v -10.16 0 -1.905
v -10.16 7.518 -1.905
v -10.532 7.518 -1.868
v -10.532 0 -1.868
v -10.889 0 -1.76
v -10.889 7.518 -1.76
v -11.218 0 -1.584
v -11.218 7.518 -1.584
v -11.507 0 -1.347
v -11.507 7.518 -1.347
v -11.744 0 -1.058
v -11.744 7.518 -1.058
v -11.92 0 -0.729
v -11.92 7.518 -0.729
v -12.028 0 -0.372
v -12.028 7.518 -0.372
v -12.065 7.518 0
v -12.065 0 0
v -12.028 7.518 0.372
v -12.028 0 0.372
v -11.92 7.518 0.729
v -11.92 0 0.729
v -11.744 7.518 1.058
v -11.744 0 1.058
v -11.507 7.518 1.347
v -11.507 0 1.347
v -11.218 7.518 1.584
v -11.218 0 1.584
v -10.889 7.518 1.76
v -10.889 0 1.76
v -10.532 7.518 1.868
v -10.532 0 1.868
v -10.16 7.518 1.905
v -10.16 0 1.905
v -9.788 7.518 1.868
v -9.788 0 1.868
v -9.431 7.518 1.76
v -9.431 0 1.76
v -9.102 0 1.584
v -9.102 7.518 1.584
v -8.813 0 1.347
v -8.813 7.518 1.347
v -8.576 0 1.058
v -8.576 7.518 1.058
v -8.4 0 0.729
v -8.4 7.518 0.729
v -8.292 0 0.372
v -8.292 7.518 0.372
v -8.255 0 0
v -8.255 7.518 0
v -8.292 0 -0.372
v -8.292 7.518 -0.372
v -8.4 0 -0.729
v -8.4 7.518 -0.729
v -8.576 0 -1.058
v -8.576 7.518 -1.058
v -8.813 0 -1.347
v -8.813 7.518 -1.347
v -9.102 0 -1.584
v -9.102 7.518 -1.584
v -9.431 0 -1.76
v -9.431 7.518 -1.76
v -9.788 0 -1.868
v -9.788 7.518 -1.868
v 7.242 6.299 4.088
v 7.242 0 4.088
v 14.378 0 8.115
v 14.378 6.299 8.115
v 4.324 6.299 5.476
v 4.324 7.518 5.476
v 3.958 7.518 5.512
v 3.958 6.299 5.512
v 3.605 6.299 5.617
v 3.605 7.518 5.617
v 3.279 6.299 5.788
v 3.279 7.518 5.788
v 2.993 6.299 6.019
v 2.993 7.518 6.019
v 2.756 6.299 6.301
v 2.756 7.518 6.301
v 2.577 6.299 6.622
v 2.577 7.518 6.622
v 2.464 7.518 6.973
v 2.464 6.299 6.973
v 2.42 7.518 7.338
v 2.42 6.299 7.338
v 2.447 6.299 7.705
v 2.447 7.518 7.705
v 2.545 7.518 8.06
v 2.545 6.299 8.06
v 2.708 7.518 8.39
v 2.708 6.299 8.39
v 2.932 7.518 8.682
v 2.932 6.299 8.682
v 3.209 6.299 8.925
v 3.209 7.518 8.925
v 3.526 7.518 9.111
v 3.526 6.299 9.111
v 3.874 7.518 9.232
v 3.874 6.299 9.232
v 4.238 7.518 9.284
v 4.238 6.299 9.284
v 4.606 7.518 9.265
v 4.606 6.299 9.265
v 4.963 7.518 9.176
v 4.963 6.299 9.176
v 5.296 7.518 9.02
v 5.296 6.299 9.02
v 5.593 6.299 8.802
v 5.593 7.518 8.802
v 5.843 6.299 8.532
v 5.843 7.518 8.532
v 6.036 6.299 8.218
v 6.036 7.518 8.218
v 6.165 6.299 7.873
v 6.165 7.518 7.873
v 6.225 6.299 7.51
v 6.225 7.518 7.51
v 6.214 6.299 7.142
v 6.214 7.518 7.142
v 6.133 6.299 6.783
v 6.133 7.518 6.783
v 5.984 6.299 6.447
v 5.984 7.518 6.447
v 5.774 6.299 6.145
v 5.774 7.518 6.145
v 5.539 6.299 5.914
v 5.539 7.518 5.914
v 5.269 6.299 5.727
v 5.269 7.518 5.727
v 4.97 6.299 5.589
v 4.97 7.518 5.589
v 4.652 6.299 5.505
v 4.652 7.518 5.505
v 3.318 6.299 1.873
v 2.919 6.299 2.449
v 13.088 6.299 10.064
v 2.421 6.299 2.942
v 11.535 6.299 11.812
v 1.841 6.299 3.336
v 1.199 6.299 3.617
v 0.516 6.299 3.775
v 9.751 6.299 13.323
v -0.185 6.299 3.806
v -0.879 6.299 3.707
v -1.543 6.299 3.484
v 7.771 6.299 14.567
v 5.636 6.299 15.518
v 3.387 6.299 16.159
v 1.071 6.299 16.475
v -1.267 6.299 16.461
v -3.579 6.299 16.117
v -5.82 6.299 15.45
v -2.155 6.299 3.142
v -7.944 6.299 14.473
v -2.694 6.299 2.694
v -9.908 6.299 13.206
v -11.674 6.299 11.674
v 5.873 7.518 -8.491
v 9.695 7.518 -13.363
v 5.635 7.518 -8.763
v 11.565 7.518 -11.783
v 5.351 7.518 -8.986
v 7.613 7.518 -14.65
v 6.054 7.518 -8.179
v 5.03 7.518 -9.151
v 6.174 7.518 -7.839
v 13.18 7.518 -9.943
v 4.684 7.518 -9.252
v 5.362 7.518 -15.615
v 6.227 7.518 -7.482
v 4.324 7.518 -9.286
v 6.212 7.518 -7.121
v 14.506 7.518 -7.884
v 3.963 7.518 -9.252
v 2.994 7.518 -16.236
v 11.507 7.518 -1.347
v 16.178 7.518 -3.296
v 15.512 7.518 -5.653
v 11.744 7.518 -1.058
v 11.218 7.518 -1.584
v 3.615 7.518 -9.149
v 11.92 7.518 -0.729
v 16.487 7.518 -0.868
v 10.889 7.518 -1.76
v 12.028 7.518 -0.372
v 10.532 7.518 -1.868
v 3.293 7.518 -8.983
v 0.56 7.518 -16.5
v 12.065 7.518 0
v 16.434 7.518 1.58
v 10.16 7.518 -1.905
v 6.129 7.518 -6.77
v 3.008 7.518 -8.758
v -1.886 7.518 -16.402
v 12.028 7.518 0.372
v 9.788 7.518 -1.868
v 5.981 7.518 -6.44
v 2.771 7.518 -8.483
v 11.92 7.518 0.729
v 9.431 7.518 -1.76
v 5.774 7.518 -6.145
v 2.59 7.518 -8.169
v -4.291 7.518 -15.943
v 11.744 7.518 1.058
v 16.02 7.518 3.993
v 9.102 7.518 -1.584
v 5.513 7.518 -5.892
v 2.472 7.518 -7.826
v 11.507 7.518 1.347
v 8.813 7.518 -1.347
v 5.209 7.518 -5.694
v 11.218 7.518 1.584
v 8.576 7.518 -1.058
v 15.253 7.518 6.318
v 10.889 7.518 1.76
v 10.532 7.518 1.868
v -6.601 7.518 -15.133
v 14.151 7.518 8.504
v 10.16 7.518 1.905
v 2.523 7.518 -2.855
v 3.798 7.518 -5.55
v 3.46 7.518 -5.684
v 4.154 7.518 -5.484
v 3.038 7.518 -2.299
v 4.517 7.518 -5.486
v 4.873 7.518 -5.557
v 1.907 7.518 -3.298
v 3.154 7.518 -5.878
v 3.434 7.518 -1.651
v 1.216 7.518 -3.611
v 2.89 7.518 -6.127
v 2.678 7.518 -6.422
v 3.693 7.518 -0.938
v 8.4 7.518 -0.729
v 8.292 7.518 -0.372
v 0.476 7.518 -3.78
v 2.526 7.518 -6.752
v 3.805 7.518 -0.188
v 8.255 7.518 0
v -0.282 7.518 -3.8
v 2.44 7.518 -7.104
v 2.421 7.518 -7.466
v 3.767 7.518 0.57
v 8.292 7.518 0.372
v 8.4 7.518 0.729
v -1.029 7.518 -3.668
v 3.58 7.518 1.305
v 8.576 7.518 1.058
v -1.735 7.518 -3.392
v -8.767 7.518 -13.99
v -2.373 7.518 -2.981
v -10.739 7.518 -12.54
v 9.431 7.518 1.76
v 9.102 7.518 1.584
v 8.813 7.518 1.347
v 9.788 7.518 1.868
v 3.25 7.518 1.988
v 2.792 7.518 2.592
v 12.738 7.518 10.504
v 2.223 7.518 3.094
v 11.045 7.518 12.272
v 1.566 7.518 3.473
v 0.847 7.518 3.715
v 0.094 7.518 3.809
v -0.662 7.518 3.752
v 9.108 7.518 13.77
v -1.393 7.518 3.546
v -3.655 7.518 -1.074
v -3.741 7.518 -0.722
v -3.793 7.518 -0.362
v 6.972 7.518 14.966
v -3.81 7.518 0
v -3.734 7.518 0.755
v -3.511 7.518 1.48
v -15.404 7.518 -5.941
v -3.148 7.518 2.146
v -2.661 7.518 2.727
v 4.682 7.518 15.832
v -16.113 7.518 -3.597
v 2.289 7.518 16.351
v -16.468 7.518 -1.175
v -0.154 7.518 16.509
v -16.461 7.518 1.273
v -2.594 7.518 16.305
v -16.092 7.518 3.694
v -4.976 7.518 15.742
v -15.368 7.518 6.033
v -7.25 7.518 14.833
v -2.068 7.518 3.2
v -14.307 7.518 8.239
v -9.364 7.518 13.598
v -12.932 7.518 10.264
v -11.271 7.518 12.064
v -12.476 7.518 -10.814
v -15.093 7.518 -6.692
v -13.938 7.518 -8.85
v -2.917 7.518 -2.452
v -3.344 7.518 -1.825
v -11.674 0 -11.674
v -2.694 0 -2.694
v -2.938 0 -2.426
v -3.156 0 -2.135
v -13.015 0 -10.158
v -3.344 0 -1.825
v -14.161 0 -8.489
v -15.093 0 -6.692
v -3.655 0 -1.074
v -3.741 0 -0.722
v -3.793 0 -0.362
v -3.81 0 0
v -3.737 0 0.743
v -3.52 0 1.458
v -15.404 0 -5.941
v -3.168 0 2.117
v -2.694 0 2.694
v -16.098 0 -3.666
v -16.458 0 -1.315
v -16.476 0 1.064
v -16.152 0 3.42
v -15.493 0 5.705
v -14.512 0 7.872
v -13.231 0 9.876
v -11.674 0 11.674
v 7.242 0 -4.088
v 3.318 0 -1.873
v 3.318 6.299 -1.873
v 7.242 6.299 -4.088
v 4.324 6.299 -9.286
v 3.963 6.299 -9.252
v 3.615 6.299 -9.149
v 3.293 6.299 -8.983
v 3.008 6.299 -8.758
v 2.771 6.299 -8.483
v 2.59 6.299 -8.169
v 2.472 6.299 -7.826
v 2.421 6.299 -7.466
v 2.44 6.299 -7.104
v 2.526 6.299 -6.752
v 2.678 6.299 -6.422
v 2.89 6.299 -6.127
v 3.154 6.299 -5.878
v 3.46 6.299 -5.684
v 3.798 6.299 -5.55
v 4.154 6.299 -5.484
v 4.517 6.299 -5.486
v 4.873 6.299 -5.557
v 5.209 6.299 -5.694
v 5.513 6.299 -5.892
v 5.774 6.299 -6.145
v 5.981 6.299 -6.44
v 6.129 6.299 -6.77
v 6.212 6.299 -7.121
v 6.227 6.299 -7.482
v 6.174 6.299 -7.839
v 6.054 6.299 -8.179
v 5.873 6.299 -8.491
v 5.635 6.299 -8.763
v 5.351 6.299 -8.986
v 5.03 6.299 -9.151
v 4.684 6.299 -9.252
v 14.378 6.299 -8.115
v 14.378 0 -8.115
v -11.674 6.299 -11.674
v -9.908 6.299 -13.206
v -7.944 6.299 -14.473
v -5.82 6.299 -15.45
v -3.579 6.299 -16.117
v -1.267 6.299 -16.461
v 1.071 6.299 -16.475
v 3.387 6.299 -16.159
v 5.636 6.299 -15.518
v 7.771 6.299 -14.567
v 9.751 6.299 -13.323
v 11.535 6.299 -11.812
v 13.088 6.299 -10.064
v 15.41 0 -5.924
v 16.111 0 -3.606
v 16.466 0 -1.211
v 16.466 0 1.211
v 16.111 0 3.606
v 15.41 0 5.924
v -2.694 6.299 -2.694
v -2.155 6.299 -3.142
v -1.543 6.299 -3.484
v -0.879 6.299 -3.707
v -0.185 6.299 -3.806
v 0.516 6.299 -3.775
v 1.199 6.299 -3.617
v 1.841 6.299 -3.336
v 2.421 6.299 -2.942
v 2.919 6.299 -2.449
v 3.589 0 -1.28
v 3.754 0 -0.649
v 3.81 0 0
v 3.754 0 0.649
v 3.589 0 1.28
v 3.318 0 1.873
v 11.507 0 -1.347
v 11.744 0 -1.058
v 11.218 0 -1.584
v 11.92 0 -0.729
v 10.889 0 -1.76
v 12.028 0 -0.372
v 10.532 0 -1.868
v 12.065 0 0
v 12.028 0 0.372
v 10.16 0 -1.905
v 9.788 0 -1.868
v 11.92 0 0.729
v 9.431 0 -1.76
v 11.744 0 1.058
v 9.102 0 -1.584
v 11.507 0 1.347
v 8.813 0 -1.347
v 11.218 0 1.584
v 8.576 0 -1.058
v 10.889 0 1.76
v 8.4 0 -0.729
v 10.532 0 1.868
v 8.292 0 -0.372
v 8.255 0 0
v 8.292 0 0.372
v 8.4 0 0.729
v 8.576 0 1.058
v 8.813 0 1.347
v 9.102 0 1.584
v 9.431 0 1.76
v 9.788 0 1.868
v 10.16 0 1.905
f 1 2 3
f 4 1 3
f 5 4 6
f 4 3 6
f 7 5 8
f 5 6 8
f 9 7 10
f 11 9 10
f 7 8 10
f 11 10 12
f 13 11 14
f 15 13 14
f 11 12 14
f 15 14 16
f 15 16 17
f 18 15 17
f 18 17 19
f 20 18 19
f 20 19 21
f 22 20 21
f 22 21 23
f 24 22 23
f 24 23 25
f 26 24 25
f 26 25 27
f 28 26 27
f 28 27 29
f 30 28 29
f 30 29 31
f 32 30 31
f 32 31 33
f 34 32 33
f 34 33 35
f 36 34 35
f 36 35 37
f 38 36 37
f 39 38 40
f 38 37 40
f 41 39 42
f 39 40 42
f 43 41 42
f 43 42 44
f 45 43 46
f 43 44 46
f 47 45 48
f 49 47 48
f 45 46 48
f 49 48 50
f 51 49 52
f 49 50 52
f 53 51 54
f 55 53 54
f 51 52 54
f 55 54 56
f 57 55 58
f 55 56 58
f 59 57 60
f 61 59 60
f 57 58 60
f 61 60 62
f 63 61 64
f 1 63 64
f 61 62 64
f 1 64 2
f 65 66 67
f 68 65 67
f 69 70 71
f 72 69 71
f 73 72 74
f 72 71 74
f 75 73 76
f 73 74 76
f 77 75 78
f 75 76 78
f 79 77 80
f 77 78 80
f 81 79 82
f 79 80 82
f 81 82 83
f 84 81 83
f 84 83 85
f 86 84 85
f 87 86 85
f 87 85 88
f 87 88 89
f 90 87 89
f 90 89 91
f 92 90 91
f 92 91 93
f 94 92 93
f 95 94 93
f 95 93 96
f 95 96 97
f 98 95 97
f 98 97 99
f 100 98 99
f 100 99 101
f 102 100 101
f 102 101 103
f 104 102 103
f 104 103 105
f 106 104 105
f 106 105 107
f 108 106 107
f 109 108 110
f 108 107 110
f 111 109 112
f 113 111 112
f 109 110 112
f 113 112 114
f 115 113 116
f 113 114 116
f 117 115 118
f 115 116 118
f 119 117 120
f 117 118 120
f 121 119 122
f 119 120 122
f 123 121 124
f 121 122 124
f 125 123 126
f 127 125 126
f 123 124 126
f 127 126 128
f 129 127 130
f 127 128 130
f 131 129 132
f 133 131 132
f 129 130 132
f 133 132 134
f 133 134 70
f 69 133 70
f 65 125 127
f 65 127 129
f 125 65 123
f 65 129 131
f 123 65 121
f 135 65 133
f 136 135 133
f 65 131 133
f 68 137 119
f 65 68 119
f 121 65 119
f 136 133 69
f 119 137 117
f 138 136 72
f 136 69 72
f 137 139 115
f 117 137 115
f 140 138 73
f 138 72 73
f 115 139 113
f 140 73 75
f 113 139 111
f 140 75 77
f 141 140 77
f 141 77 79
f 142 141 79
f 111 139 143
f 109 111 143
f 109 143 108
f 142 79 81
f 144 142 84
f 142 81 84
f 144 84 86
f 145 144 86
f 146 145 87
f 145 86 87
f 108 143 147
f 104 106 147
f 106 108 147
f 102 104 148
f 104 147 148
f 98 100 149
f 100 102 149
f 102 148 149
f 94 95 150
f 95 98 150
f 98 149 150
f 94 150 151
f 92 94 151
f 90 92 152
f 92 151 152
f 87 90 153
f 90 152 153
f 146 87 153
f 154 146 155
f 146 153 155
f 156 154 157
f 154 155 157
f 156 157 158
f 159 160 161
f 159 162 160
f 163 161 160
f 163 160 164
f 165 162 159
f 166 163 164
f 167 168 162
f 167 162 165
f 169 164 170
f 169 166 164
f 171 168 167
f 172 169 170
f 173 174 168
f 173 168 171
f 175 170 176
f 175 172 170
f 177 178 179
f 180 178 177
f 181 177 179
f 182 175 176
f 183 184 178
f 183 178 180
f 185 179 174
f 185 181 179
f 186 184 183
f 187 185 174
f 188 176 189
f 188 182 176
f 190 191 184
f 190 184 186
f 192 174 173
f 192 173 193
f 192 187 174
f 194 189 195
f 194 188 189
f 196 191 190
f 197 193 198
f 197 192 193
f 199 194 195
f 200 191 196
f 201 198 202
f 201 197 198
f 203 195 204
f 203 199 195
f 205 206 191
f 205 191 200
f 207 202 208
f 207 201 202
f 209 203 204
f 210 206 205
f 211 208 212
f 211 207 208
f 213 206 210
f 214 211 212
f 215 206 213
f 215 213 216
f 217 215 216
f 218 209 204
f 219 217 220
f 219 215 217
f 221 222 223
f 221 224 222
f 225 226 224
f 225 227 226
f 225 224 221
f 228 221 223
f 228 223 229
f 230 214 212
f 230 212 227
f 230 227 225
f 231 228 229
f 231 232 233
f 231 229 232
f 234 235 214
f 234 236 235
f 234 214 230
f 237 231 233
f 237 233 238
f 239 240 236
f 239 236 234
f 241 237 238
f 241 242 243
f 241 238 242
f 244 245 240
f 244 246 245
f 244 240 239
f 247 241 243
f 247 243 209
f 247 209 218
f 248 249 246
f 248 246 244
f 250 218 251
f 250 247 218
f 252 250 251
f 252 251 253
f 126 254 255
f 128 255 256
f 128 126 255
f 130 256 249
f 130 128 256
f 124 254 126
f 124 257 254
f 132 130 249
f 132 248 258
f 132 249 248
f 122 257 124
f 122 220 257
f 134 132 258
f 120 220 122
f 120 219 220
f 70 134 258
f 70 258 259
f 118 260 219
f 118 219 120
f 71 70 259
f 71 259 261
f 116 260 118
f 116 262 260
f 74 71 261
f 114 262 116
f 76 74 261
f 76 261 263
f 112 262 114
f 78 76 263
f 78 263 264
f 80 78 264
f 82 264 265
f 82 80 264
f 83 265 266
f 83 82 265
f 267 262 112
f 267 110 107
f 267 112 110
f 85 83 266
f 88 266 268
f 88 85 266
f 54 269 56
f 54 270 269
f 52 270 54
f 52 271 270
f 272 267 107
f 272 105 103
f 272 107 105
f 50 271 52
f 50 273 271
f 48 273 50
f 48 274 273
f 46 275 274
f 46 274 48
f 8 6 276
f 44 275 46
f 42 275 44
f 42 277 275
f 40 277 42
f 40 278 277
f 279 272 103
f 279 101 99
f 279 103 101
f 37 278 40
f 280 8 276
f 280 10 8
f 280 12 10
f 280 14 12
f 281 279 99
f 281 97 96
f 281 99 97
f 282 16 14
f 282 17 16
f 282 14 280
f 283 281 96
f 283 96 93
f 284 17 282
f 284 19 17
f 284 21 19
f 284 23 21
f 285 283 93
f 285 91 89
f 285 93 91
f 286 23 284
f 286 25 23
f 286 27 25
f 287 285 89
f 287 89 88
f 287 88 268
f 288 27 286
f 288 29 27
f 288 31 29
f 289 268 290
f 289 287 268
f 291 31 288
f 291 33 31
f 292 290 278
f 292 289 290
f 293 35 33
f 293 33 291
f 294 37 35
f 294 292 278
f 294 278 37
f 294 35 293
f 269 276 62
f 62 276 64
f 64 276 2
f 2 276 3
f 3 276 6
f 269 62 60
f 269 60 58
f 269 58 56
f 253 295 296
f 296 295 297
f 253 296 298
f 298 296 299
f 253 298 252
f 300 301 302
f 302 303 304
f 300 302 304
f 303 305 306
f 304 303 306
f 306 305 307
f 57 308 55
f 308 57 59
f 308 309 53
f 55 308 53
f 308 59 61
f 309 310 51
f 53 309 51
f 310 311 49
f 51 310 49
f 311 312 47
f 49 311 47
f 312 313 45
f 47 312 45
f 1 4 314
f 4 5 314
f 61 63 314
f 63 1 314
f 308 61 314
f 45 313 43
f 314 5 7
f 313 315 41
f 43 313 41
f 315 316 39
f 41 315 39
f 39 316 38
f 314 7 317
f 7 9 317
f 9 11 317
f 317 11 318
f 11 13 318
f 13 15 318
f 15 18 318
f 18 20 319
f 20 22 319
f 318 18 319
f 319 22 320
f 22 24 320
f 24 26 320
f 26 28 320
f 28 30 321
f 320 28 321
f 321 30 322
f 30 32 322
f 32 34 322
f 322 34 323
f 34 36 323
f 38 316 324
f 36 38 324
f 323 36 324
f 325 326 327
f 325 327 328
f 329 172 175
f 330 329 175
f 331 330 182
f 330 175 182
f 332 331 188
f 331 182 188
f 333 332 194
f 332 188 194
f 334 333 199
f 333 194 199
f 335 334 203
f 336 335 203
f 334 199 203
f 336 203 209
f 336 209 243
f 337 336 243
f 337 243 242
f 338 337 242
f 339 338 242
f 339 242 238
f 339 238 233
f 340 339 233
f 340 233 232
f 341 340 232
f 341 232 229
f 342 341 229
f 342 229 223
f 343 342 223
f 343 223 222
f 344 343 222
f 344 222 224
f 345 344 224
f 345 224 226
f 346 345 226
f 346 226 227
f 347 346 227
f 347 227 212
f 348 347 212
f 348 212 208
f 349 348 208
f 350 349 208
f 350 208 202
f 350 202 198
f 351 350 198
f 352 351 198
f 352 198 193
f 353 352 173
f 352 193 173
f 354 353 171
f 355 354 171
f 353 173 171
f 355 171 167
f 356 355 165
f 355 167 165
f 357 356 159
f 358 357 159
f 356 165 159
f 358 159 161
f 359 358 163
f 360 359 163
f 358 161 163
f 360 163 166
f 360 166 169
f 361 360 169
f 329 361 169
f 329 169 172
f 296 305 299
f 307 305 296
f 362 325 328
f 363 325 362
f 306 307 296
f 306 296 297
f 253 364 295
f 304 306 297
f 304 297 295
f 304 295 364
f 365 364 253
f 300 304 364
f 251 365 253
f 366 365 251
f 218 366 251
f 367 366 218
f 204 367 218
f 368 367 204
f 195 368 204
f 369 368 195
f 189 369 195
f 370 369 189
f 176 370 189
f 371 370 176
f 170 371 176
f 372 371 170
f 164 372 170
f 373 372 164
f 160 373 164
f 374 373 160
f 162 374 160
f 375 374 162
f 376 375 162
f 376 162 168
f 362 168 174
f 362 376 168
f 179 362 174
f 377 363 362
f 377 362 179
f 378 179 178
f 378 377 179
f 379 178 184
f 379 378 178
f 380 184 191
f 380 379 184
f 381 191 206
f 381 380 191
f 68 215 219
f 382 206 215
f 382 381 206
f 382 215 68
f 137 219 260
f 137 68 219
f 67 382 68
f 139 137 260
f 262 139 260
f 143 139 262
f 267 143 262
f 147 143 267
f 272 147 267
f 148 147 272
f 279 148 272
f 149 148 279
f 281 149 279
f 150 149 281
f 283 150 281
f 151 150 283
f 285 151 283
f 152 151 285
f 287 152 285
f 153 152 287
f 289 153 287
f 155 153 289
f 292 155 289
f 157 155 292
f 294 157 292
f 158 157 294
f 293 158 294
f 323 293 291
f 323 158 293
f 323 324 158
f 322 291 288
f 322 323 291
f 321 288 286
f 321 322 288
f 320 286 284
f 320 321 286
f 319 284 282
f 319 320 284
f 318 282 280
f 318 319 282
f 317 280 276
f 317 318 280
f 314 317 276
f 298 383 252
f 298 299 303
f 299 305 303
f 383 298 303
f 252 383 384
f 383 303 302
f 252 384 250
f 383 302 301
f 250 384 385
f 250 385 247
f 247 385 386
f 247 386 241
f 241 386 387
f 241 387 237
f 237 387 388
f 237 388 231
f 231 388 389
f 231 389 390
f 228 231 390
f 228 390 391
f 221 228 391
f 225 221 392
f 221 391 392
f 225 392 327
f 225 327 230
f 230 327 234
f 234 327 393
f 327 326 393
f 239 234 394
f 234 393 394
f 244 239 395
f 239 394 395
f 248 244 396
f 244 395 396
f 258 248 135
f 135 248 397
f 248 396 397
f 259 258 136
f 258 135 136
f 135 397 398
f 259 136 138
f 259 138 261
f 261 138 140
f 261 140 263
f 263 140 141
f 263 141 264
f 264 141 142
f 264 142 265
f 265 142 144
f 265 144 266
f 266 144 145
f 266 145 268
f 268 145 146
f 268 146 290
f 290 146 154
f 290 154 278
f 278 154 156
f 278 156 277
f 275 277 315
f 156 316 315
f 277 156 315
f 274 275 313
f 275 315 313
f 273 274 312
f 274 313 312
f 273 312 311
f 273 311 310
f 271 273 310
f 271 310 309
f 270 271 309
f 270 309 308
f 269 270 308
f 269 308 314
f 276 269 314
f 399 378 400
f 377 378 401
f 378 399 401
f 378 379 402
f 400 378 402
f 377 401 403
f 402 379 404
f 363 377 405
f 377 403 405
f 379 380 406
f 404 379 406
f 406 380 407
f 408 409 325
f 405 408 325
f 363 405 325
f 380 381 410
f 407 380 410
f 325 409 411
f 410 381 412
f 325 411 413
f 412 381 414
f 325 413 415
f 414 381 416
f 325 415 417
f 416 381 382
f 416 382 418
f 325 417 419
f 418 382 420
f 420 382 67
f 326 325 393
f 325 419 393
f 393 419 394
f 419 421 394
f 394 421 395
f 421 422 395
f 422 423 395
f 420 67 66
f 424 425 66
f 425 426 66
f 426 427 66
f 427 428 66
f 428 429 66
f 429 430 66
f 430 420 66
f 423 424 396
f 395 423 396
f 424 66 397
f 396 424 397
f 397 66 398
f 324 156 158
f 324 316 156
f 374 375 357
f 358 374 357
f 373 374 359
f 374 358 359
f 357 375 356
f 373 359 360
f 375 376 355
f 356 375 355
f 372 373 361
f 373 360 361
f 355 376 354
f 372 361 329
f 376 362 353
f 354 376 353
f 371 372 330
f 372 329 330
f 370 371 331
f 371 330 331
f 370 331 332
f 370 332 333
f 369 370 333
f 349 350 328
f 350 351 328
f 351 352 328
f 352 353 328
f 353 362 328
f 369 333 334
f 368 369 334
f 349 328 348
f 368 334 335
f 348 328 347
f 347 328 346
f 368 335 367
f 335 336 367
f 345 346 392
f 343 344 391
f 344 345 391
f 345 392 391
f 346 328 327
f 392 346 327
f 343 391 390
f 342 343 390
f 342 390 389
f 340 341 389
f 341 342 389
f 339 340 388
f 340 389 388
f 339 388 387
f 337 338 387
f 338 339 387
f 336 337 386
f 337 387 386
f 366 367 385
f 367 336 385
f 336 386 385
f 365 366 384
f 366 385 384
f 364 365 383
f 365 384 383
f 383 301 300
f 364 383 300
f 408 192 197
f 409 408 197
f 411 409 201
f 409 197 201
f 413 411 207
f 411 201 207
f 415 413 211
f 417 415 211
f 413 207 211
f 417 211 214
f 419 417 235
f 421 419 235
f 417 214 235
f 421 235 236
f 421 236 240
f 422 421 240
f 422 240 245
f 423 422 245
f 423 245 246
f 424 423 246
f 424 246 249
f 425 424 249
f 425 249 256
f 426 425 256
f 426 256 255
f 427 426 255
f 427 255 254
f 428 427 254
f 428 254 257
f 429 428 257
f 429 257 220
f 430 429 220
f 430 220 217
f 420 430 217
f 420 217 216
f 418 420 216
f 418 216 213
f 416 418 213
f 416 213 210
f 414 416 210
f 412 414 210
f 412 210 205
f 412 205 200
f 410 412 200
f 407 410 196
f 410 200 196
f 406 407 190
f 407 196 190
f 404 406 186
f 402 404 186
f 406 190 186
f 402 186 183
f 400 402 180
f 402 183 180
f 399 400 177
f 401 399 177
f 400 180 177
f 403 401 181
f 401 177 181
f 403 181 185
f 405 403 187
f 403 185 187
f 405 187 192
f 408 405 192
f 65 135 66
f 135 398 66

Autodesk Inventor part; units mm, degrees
ref_plane "YZ Plane" through (0, 0, 0) normal (1, 0, 0) x (0, 1, 0)
ref_plane "XZ Plane" through (0, 0, 0) normal (0, 1, 0) x (-1, 0, 0)
ref_plane "XY Plane" through (0, 0, 0) normal (0, 0, 1) x (1, 0, 0)
sketch "Sketch1" plane through (0, 0, 0) normal (0, 1, 0) x (-1, 0, 0)
  circle A0 centre (0, 0) radius 3.81
  circle A1 centre (0, 0) radius 16.51
  line L0 (-7.4994, -5) -> (-1.1494, -5)
  line L1 (-1.1494, -5) -> (-1.1494, -11.35)
  line L2 (-1.1494, -11.35) -> (-7.4994, -11.35)
  line L3 (-7.4994, -11.35) -> (-7.4994, -5)
  line L4 (-7.4994, 5) -> (-1.1494, 5)
  line L5 (-1.1494, 5) -> (-1.1494, 11.35)
  line L6 (-1.1494, 11.35) -> (-7.4994, 11.35)
  line L7 (-7.4994, 11.35) -> (-7.4994, 5)
  circle A2 centre (-4.3244, -7.3812) radius 1.7526
  circle A3 centre (-4.3244, 7.3812) radius 1.7526
  line L8 (0, 0) -> (-10.16, 0)
  line L9 (0, 0) -> (10.16, 0)
  circle A4 centre (-10.16, 0) radius 1.7526
  circle A5 centre (10.16, 0) radius 1.7526
  line L10 (-4.3244, -8.175) -> (-10.16, 0)
  line L11 (-10.16, 0) -> (-4.3244, 8.175)
  line L12 (0, 0) -> (-7.2422, 4.0875)
  line L13 (0, 0) -> (-7.2422, -4.0875)
  line L14 (-7.2422, -4.0875) -> (-14.378, -8.115)
  line L15 (-7.2422, 4.0875) -> (-14.378, 8.115)
  line L16 (0, 0) -> (11.6743, -11.6743)
  line L17 (0, 0) -> (16.51, 0) construction
  line L18 (0, 0) -> (11.6743, 11.6743)
  line L19 (0, 0) -> (16.51, 0) construction
  line L20 (0, 0) -> (16.51, -6.8387)
  line L21 (0, 0) -> (17.8703, 0) construction
  line L22 (1.062, 0) -> (16.6655, -6.4632)
  line L23 (0.7509, -0.7509) -> (16.3545, -7.2141)
  point P0 (-3.318, 1.8727)
  point P1 (2.6941, 2.6941)
  point P2 (2.6941, -2.6941)
  point P3 (-3.318, -1.8727)
  point P4 (3.3444, -1.8252)
  point P5 (15.0931, -6.6917)
  point P6 (15.4042, -5.9407)
  point P7 (3.6554, -1.0742)
  dimension "d0" = 7.62
  dimension "d1" = 33.02
  dimension "d2" = 6.35
  dimension "d3" = 6.35
  dimension "d4" = 6.35
  dimension "d5" = 6.35
  dimension "d6" = 3.5052
  dimension "d7" = 3.5052
  dimension "d8" = 10.16
  dimension "d9" = 10.16
  dimension "d10" = 3.5052
  dimension "d11" = 3.5052
  dimension "d12" = 45
  dimension "d13" = 45
  dimension "d25" = 22.5
  dimension "d26" = 0.4064
  dimension "d27" = 0.4064
extrude "Extrusion1" add sketch "Sketch1" along normal blind 7.5184 contours A0 L18 A1 L22 | A5 | A3 | L4 L7 L6 L5 | A0 L12 L15 A1 L18 | L22 A1 L20 A0 | A0 L8 A4 L11 L12 | L20 A1 L23 A0 | A0 L13 L10 A4 L8 | L11 A4 L10 L14 A1 L15 | A2 | L0 L1 L2 L3 | A0 L16 A1 L14 L13 | L23 A1 L16 A0 | A4 L10 L8 | L8 L11 A4 | L11 L10 A4
extrude "Extrusion2" cut sketch "Sketch1" along normal blind 6.2992 contours A3 | L4 L7 L6 L5 | A0 L12 L15 A1 L18 | A2 | L0 L1 L2 L3 | A0 L16 A1 L14 L13
hole "Hole1" at (-10.16, 0, 0) at (10.16, 0, 0) at (4.3244, 0, -7.3812) at (4.3244, 0, 7.3812) direction (0, 1, 0) diameter 3.81 end through all clearance for "Flat Head Machine Screw (82)" size "#6" standard "Ansi Unified Screw Threads"
extrude "Extrusion3" cut sketch "Sketch1" along normal blind 7.5184 contours L22 A1 L20 A0 | L20 A1 L23 A0
properties part number "tab4"
